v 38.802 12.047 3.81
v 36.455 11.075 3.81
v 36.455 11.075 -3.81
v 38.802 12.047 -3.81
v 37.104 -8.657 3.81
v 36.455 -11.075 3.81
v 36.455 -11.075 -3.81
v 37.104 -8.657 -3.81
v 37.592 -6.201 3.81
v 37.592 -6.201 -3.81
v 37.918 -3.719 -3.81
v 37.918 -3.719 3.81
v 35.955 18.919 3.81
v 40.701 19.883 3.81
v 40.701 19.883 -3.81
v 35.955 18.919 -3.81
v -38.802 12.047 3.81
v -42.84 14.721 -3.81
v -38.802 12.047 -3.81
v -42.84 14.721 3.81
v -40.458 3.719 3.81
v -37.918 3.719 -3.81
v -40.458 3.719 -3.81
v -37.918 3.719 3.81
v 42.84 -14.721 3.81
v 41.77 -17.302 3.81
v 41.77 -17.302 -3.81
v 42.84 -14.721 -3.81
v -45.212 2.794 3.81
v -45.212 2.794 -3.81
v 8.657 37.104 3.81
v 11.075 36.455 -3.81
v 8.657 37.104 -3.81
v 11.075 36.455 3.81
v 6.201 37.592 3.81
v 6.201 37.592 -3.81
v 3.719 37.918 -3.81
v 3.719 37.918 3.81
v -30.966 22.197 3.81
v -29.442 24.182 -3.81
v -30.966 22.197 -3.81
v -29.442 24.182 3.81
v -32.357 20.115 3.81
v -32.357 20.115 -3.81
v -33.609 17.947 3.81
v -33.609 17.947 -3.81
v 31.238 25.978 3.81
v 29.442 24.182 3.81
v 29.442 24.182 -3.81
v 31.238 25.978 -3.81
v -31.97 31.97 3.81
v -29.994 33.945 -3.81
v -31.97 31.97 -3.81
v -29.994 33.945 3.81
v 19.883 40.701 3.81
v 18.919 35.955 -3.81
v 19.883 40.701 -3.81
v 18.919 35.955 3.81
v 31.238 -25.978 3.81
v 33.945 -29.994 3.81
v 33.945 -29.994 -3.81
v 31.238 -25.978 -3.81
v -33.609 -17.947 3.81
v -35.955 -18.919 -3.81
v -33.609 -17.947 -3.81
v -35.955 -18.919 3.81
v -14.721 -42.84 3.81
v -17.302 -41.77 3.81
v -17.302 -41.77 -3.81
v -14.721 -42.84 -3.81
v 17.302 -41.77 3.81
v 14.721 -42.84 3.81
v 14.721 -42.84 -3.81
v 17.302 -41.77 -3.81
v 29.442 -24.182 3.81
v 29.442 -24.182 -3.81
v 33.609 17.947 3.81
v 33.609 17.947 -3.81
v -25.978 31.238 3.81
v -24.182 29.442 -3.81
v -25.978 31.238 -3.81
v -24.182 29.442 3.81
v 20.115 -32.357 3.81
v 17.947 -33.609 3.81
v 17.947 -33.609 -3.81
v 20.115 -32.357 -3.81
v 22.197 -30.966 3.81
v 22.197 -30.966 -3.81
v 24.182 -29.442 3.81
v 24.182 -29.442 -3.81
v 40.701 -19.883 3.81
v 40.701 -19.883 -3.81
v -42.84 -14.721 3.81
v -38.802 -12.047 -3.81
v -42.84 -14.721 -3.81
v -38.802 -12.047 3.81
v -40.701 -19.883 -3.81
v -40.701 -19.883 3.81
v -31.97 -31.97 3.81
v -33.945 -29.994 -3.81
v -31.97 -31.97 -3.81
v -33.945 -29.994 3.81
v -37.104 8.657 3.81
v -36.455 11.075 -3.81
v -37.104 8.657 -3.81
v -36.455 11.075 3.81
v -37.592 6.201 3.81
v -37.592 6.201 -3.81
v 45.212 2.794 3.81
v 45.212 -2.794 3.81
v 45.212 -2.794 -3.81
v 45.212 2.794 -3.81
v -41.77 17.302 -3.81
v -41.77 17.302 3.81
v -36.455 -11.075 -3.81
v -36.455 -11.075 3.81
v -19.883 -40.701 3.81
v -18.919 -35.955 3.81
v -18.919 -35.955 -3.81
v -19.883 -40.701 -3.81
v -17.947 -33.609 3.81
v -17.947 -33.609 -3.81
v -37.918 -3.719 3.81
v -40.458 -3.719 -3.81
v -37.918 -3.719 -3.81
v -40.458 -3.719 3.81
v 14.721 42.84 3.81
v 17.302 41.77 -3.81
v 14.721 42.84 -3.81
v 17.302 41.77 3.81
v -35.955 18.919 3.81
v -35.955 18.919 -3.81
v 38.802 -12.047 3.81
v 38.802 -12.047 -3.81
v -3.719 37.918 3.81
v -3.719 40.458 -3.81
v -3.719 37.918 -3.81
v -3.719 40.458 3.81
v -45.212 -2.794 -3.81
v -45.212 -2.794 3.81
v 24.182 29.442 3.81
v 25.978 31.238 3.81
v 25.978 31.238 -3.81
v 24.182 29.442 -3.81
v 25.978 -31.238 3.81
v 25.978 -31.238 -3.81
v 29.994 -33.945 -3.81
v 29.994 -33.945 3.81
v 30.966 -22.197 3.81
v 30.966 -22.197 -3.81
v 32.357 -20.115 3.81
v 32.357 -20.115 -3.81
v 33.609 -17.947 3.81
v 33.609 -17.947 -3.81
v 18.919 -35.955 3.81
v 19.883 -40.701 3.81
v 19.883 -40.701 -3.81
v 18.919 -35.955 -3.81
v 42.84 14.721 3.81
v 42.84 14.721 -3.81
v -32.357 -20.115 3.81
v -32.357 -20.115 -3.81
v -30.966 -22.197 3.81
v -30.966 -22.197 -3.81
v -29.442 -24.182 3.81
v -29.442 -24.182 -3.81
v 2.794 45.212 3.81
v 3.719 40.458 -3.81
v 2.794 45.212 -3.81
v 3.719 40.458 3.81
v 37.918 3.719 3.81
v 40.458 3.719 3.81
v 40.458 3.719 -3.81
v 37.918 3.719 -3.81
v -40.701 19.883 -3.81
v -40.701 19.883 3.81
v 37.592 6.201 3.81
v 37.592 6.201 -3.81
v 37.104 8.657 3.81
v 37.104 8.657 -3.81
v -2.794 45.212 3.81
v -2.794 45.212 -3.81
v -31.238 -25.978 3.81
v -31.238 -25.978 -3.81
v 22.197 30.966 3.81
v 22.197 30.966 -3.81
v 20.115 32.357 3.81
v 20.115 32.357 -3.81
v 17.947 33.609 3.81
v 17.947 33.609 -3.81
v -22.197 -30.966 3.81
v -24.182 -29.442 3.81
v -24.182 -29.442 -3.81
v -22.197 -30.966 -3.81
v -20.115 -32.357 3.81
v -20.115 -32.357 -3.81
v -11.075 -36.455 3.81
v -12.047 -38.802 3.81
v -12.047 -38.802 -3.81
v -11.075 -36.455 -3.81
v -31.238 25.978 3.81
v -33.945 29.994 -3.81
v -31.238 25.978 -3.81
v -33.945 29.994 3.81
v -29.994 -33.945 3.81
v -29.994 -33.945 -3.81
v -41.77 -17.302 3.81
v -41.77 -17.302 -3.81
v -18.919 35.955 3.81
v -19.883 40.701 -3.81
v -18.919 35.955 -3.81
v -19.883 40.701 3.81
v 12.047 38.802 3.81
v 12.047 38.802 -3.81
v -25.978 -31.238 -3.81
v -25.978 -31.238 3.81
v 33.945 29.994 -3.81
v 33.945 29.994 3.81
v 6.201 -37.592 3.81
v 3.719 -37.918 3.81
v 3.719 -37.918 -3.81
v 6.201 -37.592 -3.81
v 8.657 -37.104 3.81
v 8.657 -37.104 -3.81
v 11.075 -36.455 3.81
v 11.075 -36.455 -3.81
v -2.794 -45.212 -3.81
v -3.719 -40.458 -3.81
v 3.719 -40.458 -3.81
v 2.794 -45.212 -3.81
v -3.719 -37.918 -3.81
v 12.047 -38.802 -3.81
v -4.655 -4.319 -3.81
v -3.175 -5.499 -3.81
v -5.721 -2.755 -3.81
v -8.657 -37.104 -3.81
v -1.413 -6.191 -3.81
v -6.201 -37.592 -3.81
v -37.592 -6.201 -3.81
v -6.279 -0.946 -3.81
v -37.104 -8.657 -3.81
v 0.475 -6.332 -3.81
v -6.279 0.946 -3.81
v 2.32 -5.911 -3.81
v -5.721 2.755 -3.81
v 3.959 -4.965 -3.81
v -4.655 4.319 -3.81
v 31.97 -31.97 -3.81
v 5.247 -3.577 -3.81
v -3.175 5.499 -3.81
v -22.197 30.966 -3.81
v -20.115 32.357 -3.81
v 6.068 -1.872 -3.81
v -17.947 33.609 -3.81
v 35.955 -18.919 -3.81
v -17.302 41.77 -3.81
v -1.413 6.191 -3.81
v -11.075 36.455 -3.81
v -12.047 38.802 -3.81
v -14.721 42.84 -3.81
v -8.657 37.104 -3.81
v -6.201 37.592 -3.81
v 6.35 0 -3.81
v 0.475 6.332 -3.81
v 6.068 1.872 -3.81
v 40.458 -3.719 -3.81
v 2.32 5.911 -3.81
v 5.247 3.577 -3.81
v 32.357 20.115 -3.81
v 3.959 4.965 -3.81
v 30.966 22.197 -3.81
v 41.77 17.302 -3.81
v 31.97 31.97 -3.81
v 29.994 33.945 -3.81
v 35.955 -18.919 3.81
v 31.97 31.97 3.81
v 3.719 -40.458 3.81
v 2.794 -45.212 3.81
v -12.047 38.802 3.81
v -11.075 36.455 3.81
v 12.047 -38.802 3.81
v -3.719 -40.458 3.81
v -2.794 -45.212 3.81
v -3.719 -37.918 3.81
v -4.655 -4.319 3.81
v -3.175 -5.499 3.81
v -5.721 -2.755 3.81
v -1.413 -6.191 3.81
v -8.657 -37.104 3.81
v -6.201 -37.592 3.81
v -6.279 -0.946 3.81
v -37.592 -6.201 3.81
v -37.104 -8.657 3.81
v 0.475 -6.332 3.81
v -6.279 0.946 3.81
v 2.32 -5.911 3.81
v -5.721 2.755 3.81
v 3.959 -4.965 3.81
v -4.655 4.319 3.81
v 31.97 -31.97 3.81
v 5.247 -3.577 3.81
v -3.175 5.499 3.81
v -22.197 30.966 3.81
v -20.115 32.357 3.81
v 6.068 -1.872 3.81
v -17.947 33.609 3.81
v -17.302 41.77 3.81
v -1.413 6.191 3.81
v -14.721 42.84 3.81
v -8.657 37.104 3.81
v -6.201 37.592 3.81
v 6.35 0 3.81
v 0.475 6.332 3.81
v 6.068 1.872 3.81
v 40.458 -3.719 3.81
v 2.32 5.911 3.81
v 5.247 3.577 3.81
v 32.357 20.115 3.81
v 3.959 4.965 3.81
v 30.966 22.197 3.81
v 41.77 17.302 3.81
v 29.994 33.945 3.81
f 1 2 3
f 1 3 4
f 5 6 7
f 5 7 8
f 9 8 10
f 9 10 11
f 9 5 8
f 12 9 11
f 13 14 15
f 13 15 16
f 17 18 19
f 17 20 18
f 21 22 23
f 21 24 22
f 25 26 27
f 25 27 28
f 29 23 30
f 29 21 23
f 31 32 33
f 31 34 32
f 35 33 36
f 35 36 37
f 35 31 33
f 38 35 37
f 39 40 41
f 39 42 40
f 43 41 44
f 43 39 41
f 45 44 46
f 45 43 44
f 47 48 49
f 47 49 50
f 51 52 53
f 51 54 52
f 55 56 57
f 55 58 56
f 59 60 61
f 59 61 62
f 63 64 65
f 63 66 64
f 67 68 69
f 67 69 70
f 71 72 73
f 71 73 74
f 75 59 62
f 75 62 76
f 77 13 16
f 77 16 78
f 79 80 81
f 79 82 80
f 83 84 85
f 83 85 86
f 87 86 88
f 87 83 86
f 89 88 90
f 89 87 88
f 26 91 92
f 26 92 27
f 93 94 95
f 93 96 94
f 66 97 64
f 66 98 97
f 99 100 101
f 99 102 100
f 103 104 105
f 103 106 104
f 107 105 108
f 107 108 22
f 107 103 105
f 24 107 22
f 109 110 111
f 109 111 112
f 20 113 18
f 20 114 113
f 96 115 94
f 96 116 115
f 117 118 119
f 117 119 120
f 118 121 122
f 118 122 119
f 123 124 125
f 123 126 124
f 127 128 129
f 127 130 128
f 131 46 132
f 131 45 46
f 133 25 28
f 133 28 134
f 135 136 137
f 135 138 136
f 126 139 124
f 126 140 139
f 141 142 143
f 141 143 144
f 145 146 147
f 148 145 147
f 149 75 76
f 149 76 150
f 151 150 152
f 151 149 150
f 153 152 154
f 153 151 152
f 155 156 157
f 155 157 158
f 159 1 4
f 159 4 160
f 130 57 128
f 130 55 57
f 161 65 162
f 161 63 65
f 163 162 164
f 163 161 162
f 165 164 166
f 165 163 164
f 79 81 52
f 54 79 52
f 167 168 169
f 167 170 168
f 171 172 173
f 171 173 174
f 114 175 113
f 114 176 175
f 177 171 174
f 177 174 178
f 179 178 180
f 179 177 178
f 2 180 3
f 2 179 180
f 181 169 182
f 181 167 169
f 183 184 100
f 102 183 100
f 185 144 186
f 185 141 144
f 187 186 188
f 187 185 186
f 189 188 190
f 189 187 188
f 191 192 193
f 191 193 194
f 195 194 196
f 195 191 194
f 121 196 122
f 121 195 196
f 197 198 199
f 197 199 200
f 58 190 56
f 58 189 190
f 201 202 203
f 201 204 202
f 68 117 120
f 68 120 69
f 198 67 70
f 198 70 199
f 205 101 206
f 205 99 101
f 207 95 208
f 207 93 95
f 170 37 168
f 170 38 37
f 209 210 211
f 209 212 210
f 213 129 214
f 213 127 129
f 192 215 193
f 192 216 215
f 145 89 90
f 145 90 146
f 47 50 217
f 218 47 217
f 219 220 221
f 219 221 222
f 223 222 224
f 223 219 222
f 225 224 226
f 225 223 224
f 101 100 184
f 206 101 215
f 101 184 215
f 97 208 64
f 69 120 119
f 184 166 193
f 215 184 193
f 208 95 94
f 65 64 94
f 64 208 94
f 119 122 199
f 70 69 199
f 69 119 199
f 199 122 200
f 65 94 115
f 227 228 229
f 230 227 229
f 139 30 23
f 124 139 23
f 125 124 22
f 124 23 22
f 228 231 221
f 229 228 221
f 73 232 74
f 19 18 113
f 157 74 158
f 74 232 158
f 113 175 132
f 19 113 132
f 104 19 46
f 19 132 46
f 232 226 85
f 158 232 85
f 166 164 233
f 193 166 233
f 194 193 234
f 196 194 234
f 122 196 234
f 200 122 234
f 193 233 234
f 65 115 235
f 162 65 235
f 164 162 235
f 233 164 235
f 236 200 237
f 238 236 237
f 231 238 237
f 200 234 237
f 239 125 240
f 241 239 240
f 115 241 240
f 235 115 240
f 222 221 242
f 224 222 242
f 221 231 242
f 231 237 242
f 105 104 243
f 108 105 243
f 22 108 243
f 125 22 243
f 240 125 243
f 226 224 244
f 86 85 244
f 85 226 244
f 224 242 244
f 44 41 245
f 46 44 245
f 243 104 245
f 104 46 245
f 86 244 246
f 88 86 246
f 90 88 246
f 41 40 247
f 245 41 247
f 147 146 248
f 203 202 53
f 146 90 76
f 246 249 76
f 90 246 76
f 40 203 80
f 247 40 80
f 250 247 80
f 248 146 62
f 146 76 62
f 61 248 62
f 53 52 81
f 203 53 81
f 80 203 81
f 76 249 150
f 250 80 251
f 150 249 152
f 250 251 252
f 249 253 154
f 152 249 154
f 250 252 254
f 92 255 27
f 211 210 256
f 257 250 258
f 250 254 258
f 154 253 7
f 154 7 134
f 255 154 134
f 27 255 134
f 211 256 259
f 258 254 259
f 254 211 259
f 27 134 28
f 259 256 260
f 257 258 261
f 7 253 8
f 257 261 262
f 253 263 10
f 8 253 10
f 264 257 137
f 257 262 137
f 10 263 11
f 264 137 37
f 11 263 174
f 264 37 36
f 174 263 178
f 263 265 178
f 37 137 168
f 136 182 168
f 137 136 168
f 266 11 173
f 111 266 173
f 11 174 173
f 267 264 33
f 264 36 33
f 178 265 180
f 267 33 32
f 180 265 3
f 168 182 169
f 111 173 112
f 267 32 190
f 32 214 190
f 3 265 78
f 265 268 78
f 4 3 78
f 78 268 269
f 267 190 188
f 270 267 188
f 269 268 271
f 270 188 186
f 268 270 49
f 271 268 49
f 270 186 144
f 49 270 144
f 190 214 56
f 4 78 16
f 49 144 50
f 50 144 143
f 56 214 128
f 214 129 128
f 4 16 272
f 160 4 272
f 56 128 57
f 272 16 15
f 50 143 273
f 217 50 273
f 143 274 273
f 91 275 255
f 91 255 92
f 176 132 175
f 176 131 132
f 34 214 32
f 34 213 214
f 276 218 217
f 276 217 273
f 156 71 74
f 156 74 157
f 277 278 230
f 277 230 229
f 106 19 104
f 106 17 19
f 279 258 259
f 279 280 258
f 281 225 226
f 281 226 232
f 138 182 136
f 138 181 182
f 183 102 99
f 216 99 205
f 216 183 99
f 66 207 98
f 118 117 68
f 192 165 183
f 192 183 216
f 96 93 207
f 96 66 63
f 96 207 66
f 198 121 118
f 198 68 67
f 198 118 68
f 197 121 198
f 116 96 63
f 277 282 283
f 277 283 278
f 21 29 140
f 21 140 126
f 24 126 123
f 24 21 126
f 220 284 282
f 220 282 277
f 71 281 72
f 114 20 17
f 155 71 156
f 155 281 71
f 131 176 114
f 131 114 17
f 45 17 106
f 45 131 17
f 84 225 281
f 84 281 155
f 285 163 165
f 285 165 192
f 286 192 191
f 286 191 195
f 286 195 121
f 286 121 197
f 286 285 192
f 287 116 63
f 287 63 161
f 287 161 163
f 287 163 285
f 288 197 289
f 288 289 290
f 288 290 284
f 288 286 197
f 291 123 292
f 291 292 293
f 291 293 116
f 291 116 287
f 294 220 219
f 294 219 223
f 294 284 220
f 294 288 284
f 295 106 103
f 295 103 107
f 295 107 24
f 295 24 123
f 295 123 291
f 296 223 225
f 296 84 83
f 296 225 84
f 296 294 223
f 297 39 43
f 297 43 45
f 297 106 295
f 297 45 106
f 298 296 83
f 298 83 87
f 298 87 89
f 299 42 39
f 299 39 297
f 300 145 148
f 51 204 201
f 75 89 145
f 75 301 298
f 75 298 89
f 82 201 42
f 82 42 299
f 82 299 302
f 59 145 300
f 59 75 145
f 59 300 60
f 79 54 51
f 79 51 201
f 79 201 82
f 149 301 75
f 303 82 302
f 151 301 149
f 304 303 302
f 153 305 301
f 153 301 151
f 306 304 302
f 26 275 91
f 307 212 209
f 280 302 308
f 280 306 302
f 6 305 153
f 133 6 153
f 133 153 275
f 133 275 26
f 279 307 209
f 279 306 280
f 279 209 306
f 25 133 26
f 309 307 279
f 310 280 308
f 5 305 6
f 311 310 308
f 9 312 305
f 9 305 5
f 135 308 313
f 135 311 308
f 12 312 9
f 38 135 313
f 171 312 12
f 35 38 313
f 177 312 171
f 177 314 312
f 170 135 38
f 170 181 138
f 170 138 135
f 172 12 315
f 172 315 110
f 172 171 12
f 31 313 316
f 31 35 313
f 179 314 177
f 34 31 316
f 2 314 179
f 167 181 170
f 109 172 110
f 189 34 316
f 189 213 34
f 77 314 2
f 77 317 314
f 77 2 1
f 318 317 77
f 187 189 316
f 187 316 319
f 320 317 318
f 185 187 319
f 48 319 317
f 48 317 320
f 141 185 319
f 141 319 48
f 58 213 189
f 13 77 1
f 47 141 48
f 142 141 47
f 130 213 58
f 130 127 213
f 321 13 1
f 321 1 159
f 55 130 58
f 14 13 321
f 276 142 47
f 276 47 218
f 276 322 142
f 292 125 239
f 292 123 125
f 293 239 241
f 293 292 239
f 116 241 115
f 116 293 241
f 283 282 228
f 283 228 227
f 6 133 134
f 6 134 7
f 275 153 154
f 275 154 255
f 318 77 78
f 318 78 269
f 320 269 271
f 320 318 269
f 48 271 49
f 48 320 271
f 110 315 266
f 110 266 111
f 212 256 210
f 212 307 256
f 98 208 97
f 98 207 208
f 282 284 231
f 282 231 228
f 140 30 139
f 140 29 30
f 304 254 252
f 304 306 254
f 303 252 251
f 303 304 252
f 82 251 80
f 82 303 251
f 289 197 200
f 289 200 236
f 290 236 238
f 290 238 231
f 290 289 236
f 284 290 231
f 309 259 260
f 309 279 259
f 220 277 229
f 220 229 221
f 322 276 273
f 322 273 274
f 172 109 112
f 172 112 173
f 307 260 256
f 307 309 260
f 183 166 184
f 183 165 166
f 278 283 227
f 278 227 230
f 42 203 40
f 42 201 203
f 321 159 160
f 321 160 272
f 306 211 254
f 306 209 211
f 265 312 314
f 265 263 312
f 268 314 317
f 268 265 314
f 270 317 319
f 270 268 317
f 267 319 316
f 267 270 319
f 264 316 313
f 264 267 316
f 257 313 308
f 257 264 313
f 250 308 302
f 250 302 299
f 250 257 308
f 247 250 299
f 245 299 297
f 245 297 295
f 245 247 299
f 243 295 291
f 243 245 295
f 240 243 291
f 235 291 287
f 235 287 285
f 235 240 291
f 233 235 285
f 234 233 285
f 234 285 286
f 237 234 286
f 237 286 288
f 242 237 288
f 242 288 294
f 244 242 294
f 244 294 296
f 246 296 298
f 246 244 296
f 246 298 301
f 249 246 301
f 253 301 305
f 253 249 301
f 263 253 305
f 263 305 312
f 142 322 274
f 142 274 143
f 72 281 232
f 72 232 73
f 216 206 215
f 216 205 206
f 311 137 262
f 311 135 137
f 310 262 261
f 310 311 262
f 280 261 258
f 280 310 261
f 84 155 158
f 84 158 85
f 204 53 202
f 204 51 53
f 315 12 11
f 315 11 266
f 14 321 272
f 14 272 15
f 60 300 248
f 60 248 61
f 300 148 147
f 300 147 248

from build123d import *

# Parameters (mm, degrees)
F0_R     = 6.35
F1_DEPTH = 3.81


with BuildPart() as f1:
    # F0 (on Top) → F1 (new body, symmetric)
    with BuildSketch(Plane.XY):
        with BuildLine():
            Line((-25.978442, -31.237892), (-24.182391, -29.441841))
            ThreePointArc((-24.182391, -29.441841), (-21.167226, -31.678992), (-17.946514, -33.60852))
            Line((-17.946514, -33.60852), (-18.91853, -35.955174))
            Line((-18.91853, -35.955174), (-19.883203, -40.701224))
            Line((-19.883203, -40.701224), (-17.301883, -41.770441))
            Line((-17.301883, -41.770441), (-14.720564, -42.839659))
            Line((-14.720564, -42.839659), (-12.046727, -38.801568))
            Line((-12.046727, -38.801568), (-11.074711, -36.454914))
            ThreePointArc((-11.074711, -36.454914), (-7.432941, -37.367919), (-3.718993, -37.918058))
            Line((-3.718993, -37.918058), (-3.718993, -40.458058))
            Line((-3.718993, -40.458058), (-2.794, -45.212))
            Line((-2.794, -45.212), (0, -45.212))
            Line((0, -45.212), (2.794, -45.212))
            Line((2.794, -45.212), (3.718993, -40.458058))
            Line((3.718993, -40.458058), (3.718993, -37.918058))
            ThreePointArc((3.718993, -37.918058), (7.432941, -37.367919), (11.074711, -36.454914))
            Line((11.074711, -36.454914), (12.046727, -38.801568))
            Line((12.046727, -38.801568), (14.720564, -42.839659))
            Line((14.720564, -42.839659), (17.301883, -41.770441))
            Line((17.301883, -41.770441), (19.883203, -40.701224))
            Line((19.883203, -40.701224), (18.91853, -35.955174))
            Line((18.91853, -35.955174), (17.946514, -33.60852))
            ThreePointArc((17.946514, -33.60852), (21.167226, -31.678992), (24.182391, -29.441841))
            Line((24.182391, -29.441841), (25.978442, -31.237892))
            Line((25.978442, -31.237892), (29.994055, -33.945368))
            Line((29.994055, -33.945368), (31.969712, -31.969712))
            Line((31.969712, -31.969712), (33.945368, -29.994055))
            Line((33.945368, -29.994055), (31.237892, -25.978442))
            Line((31.237892, -25.978442), (29.441841, -24.182391))
            ThreePointArc((29.441841, -24.182391), (31.678992, -21.167226), (33.60852, -17.946514))
            Line((33.60852, -17.946514), (35.955174, -18.91853))
            Line((35.955174, -18.91853), (40.701224, -19.883203))
            Line((40.701224, -19.883203), (41.770441, -17.301883))
            Line((41.770441, -17.301883), (42.839659, -14.720564))
            Line((42.839659, -14.720564), (38.801568, -12.046727))
            Line((38.801568, -12.046727), (36.454914, -11.074711))
            ThreePointArc((36.454914, -11.074711), (37.367919, -7.432941), (37.918058, -3.718993))
            Line((37.918058, -3.718993), (40.458058, -3.718993))
            Line((40.458058, -3.718993), (45.212, -2.794))
            Line((45.212, -2.794), (45.212, 0))
            Line((45.212, 0), (45.212, 2.794))
            Line((45.212, 2.794), (40.458058, 3.718993))
            Line((40.458058, 3.718993), (37.918058, 3.718993))
            ThreePointArc((37.918058, 3.718993), (37.367919, 7.432941), (36.454914, 11.074711))
            Line((36.454914, 11.074711), (38.801568, 12.046727))
            Line((38.801568, 12.046727), (42.839659, 14.720564))
            Line((42.839659, 14.720564), (41.770441, 17.301883))
            Line((41.770441, 17.301883), (40.701224, 19.883203))
            Line((40.701224, 19.883203), (35.955174, 18.91853))
            Line((35.955174, 18.91853), (33.60852, 17.946514))
            ThreePointArc((33.60852, 17.946514), (31.678992, 21.167226), (29.441841, 24.182391))
            Line((29.441841, 24.182391), (31.237892, 25.978442))
            Line((31.237892, 25.978442), (33.945368, 29.994055))
            Line((33.945368, 29.994055), (31.969712, 31.969712))
            Line((31.969712, 31.969712), (29.994055, 33.945368))
            Line((29.994055, 33.945368), (25.978442, 31.237892))
            Line((25.978442, 31.237892), (24.182391, 29.441841))
            ThreePointArc((24.182391, 29.441841), (21.167226, 31.678992), (17.946514, 33.60852))
            Line((17.946514, 33.60852), (18.91853, 35.955174))
            Line((18.91853, 35.955174), (19.883203, 40.701224))
            Line((19.883203, 40.701224), (17.301883, 41.770441))
            Line((17.301883, 41.770441), (14.720564, 42.839659))
            Line((14.720564, 42.839659), (12.046727, 38.801568))
            Line((12.046727, 38.801568), (11.074711, 36.454914))
            ThreePointArc((11.074711, 36.454914), (7.432941, 37.367919), (3.718993, 37.918058))
            Line((3.718993, 37.918058), (3.718993, 40.458058))
            Line((3.718993, 40.458058), (2.794, 45.212))
            Line((2.794, 45.212), (0, 45.212))
            Line((0, 45.212), (-2.794, 45.212))
            Line((-2.794, 45.212), (-3.718993, 40.458058))
            Line((-3.718993, 40.458058), (-3.718993, 37.918058))
            ThreePointArc((-3.718993, 37.918058), (-7.432941, 37.367919), (-11.074711, 36.454914))
            Line((-11.074711, 36.454914), (-12.046727, 38.801568))
            Line((-12.046727, 38.801568), (-14.720564, 42.839659))
            Line((-14.720564, 42.839659), (-17.301883, 41.770441))
            Line((-17.301883, 41.770441), (-19.883203, 40.701224))
            Line((-19.883203, 40.701224), (-18.91853, 35.955174))
            Line((-18.91853, 35.955174), (-17.946514, 33.60852))
            ThreePointArc((-17.946514, 33.60852), (-21.167226, 31.678992), (-24.182391, 29.441841))
            Line((-24.182391, 29.441841), (-25.978442, 31.237892))
            Line((-25.978442, 31.237892), (-29.994055, 33.945368))
            Line((-29.994055, 33.945368), (-31.969712, 31.969712))
            Line((-31.969712, 31.969712), (-33.945368, 29.994055))
            Line((-33.945368, 29.994055), (-31.237892, 25.978442))
            Line((-31.237892, 25.978442), (-29.441841, 24.182391))
            ThreePointArc((-29.441841, 24.182391), (-31.678992, 21.167226), (-33.60852, 17.946514))
            Line((-33.60852, 17.946514), (-35.955174, 18.91853))
            Line((-35.955174, 18.91853), (-40.701224, 19.883203))
            Line((-40.701224, 19.883203), (-41.770441, 17.301883))
            Line((-41.770441, 17.301883), (-42.839659, 14.720564))
            Line((-42.839659, 14.720564), (-38.801568, 12.046727))
            Line((-38.801568, 12.046727), (-36.454914, 11.074711))
            ThreePointArc((-36.454914, 11.074711), (-37.367919, 7.432941), (-37.918058, 3.718993))
            Line((-37.918058, 3.718993), (-40.458058, 3.718993))
            Line((-40.458058, 3.718993), (-45.212, 2.794))
            Line((-45.212, 2.794), (-45.212, 0))
            Line((-45.212, 0), (-45.212, -2.794))
            Line((-45.212, -2.794), (-40.458058, -3.718993))
            Line((-40.458058, -3.718993), (-37.918058, -3.718993))
            ThreePointArc((-37.918058, -3.718993), (-37.367919, -7.432941), (-36.454914, -11.074711))
            Line((-36.454914, -11.074711), (-38.801568, -12.046727))
            Line((-38.801568, -12.046727), (-42.839659, -14.720564))
            Line((-42.839659, -14.720564), (-41.770441, -17.301883))
            Line((-41.770441, -17.301883), (-40.701224, -19.883203))
            Line((-40.701224, -19.883203), (-35.955174, -18.91853))
            Line((-35.955174, -18.91853), (-33.60852, -17.946514))
            ThreePointArc((-33.60852, -17.946514), (-31.678992, -21.167226), (-29.441841, -24.182391))
            Line((-29.441841, -24.182391), (-31.237892, -25.978442))
            Line((-31.237892, -25.978442), (-33.945368, -29.994055))
            Line((-33.945368, -29.994055), (-31.969712, -31.969712))
            Line((-31.969712, -31.969712), (-29.994055, -33.945368))
            Line((-29.994055, -33.945368), (-25.978442, -31.237892))
        make_face()
        Circle(F0_R, mode=Mode.SUBTRACT)
    extrude(amount=F1_DEPTH, both=True)


solid = f1.part
